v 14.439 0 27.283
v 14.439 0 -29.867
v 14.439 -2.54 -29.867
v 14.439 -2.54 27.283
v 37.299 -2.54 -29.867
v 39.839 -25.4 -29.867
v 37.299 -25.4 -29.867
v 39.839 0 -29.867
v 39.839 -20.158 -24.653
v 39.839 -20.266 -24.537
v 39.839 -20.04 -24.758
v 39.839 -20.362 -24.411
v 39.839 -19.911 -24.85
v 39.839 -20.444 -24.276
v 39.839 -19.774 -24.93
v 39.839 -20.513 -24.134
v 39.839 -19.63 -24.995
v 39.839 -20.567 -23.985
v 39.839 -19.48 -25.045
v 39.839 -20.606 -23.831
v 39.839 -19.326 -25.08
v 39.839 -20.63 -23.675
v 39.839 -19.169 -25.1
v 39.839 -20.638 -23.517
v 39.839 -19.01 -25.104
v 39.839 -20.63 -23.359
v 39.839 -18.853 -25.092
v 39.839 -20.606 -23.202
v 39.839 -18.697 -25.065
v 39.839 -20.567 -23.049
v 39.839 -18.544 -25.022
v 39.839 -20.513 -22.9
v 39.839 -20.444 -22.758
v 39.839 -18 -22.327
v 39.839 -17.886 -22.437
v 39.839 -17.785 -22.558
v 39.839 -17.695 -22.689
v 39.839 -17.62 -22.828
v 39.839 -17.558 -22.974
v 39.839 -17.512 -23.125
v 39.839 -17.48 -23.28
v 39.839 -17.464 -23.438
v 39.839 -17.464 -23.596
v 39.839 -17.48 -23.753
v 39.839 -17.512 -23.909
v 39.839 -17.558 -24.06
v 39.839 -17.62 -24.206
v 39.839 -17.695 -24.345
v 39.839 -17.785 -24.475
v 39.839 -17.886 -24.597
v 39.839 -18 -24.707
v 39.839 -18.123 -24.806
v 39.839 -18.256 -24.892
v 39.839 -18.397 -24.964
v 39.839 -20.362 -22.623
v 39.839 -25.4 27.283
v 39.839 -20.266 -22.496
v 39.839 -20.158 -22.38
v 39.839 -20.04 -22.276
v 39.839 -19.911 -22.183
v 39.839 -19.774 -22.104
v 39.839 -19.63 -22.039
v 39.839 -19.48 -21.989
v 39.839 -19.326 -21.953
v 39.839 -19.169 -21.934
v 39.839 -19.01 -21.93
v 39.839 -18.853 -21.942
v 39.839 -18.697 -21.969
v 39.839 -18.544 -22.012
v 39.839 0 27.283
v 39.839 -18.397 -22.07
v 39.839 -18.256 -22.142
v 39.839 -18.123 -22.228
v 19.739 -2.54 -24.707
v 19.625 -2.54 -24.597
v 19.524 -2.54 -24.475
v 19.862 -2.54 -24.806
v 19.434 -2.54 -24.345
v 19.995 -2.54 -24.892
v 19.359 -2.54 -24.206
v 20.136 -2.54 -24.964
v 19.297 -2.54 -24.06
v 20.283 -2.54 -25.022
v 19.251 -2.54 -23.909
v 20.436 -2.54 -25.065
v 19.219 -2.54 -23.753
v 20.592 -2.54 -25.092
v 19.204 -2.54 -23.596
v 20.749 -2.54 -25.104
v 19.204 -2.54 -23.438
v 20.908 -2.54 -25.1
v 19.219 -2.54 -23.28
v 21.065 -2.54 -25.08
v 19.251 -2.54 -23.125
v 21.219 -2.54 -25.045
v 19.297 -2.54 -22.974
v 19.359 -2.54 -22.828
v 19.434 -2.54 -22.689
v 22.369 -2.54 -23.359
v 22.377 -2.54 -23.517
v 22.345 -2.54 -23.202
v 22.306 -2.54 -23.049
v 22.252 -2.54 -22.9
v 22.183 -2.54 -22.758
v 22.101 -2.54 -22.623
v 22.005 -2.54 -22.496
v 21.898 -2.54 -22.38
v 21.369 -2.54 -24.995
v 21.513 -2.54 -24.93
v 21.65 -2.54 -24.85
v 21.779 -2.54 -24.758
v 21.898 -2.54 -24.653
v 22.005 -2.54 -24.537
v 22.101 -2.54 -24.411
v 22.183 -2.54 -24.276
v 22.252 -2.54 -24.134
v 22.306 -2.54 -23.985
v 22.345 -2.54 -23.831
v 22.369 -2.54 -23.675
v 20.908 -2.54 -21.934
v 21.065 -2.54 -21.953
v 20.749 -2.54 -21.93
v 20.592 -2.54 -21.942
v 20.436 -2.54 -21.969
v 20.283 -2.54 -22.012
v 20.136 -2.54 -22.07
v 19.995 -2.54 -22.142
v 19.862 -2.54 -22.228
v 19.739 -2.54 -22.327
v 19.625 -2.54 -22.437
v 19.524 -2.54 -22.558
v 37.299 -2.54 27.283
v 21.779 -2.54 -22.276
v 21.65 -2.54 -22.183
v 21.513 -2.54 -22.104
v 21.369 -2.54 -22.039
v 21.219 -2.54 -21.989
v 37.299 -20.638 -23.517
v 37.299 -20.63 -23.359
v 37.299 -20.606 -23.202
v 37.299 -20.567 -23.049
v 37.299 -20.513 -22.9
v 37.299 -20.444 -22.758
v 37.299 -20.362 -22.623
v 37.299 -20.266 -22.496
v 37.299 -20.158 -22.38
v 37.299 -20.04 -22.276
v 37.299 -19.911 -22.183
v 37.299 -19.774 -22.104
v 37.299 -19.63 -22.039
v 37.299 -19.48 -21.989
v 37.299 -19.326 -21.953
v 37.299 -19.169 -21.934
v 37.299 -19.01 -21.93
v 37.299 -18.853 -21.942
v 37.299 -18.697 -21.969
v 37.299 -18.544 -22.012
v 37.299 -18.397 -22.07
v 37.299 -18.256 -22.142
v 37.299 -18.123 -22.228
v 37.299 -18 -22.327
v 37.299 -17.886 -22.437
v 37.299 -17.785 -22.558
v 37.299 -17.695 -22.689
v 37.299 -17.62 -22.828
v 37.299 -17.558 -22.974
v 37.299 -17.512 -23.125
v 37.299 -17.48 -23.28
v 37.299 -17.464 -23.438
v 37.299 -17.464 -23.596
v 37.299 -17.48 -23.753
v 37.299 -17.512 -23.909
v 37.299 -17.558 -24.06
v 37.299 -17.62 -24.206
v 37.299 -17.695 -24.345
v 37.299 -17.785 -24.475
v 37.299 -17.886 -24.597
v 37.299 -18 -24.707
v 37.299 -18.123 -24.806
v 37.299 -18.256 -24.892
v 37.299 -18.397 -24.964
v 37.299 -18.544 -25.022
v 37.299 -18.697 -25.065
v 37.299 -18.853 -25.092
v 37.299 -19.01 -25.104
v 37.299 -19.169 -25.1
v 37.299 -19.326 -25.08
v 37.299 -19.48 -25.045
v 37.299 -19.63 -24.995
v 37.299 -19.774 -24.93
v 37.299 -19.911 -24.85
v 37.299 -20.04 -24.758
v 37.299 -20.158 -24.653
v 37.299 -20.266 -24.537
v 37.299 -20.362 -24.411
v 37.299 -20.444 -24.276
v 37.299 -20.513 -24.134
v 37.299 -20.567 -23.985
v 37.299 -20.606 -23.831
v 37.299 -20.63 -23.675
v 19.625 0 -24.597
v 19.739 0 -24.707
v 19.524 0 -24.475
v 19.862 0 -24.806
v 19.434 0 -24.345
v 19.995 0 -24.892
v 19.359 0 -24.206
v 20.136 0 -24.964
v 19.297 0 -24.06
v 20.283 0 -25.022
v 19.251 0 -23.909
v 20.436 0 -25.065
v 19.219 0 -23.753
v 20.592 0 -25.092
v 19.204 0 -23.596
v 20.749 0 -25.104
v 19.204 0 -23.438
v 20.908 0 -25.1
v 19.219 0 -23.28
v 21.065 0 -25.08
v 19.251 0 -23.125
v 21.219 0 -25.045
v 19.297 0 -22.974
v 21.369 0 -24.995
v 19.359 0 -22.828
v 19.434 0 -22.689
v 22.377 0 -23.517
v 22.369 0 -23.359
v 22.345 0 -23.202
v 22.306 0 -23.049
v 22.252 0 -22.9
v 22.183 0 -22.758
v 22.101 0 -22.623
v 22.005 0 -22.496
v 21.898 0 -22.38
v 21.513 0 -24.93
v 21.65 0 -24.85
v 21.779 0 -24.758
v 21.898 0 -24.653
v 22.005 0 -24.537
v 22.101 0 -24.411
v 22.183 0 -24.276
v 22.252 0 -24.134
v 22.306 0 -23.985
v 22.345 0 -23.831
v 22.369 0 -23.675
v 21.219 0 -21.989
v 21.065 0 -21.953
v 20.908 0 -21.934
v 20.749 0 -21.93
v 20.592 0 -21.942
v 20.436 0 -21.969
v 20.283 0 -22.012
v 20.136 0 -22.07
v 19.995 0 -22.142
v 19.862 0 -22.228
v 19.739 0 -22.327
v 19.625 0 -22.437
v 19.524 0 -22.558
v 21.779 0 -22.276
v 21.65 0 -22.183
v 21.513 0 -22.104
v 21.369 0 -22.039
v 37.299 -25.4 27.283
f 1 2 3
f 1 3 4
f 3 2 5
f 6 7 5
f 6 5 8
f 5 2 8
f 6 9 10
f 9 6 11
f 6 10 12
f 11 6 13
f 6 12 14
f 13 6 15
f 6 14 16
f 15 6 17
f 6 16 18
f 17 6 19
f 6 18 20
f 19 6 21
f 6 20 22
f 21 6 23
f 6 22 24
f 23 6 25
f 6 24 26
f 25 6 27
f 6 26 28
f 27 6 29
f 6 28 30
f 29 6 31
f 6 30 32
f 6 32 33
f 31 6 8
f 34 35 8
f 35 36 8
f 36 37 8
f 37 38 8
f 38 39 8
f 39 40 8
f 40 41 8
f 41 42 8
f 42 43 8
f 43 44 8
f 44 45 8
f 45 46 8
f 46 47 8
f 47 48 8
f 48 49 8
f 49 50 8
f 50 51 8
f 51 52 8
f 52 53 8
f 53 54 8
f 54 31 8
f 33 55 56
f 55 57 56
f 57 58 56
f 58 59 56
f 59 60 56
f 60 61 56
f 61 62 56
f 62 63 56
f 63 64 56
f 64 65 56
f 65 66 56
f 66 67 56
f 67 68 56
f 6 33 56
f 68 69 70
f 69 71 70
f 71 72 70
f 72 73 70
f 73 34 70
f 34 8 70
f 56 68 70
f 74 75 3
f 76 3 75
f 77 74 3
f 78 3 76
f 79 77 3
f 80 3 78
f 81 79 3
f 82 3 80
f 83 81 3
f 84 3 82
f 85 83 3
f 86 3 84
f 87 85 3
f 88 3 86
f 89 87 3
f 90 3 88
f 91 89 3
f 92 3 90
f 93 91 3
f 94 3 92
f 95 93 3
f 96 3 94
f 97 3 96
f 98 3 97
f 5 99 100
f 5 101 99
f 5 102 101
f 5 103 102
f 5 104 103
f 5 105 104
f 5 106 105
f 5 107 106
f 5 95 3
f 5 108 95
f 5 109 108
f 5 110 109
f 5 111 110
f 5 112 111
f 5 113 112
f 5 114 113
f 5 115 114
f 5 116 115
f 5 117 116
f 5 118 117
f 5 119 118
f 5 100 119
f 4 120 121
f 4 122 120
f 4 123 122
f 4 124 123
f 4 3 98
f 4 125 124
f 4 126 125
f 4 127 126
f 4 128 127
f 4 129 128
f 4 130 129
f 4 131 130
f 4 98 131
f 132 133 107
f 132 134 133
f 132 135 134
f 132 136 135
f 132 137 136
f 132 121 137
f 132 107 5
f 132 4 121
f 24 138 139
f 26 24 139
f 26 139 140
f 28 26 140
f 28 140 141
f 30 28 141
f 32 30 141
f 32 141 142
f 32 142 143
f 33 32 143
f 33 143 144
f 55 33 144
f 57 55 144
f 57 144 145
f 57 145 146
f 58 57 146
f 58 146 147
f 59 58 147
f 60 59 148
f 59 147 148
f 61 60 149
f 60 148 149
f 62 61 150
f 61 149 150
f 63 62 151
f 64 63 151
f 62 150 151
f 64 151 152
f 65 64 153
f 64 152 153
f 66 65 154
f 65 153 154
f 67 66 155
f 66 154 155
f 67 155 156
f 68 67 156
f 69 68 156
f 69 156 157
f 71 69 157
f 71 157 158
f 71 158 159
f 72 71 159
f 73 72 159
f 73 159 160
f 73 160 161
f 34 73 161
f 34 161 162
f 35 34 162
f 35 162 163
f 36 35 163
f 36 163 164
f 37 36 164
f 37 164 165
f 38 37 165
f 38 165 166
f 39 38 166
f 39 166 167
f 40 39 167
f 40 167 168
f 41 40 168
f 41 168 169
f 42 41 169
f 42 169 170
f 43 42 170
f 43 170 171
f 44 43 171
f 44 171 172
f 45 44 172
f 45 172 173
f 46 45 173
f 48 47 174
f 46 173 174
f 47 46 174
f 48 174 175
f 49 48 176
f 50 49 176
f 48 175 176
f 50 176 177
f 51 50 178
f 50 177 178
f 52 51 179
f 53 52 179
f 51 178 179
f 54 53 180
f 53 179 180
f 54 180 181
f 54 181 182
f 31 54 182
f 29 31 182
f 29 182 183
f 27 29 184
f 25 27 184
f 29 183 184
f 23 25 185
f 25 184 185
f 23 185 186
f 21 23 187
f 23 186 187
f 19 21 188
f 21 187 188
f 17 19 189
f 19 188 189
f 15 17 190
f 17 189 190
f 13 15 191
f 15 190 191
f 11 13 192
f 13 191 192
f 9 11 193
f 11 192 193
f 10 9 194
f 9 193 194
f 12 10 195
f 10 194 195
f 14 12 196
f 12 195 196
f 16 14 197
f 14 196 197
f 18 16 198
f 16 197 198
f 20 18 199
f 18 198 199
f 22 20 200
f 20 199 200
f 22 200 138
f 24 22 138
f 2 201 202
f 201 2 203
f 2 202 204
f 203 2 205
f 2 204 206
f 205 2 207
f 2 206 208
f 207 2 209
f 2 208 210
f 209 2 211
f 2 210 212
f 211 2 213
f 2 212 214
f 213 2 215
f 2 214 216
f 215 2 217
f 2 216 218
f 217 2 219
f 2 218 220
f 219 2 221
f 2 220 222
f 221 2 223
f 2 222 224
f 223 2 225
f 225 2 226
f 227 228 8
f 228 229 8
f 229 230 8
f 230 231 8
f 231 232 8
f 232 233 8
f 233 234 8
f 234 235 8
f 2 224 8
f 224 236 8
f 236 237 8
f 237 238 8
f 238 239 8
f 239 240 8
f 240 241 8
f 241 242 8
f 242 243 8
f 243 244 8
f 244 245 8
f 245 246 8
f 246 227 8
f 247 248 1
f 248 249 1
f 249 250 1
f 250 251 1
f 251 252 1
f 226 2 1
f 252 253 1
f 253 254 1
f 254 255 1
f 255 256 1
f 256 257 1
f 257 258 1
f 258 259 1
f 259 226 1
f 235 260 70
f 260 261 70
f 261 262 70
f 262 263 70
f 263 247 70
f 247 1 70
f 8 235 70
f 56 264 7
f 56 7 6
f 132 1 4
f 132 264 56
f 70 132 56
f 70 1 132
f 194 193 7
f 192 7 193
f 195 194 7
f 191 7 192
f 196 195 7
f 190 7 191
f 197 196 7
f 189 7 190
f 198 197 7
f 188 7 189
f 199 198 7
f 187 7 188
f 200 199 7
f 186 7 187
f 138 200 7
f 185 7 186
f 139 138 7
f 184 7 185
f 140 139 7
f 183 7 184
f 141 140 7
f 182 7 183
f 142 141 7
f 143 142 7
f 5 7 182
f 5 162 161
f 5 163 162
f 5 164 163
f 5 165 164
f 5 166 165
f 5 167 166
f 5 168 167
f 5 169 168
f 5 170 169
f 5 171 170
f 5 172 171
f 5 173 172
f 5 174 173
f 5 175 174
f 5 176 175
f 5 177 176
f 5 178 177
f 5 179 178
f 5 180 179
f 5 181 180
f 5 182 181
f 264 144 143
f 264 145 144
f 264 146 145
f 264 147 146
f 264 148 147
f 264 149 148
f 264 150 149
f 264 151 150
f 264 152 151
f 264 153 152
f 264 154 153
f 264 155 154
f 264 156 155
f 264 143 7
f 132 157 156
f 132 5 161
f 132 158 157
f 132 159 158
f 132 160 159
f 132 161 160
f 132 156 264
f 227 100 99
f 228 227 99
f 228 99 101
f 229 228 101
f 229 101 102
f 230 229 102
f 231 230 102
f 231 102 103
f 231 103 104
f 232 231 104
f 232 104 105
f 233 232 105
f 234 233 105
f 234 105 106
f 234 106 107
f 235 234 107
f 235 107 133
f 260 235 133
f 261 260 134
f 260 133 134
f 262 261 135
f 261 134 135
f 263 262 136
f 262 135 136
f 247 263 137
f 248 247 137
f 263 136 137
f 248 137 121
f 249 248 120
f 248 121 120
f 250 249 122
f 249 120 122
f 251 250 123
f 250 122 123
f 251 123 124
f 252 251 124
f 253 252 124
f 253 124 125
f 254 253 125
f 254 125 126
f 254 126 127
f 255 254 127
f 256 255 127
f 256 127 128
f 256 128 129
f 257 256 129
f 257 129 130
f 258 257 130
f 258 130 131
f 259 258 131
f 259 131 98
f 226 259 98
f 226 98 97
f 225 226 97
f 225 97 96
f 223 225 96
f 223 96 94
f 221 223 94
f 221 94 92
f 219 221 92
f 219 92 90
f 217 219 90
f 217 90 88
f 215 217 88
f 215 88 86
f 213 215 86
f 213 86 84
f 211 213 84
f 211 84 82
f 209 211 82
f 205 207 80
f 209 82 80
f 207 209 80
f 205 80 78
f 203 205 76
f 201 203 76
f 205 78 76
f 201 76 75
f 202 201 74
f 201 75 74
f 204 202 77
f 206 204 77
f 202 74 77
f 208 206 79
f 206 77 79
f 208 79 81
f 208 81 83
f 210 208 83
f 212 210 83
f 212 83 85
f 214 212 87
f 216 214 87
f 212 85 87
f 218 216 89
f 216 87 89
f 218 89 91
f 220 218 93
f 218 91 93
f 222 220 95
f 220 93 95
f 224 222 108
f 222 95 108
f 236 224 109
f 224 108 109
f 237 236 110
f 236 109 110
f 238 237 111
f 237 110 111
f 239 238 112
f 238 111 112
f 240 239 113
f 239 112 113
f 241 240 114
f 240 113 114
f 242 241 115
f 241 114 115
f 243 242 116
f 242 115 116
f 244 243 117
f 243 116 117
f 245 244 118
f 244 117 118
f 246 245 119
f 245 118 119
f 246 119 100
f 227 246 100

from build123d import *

# Parameters (mm, degrees)
F0_W     = 25.4
F0_H     = 57.15
F1_DEPTH = 25.4
F2_T     = -2.54
F4_D     = 3.175
F6_D     = 3.175


with BuildPart() as f1:
    # F0 (on Front) → F1 (new body)
    with BuildSketch(Plane.XZ):
        with Locations((27.139076, -1.29187)):
            Rectangle(F0_W, F0_H)
    extrude(amount=F1_DEPTH)

    # F2
    f2_openings = [f1.faces().sort_by_distance(p)[0] for p in [
        (27.139076, -12.7, 27.28313),
        (27.139076, -25.4, -1.29187),
        (14.439076, -12.7, -1.29187),
        (27.139076, -12.7, -29.86687),
    ]]
    offset(amount=F2_T, openings=f2_openings)

    # F4 (through all)
    with Locations(Plane.YZ.offset(39.839076)):
        with Locations((-19.05, -23.51687)):
            Hole(F4_D / 2)

    # F6 (through all)
    with Locations(Plane(origin=(0, 0, 0), x_dir=(-1, 0, 0), z_dir=(0, 1, 0))):
        with Locations((-20.789076, -23.51687)):
            Hole(F6_D / 2)


solid = f1.part
